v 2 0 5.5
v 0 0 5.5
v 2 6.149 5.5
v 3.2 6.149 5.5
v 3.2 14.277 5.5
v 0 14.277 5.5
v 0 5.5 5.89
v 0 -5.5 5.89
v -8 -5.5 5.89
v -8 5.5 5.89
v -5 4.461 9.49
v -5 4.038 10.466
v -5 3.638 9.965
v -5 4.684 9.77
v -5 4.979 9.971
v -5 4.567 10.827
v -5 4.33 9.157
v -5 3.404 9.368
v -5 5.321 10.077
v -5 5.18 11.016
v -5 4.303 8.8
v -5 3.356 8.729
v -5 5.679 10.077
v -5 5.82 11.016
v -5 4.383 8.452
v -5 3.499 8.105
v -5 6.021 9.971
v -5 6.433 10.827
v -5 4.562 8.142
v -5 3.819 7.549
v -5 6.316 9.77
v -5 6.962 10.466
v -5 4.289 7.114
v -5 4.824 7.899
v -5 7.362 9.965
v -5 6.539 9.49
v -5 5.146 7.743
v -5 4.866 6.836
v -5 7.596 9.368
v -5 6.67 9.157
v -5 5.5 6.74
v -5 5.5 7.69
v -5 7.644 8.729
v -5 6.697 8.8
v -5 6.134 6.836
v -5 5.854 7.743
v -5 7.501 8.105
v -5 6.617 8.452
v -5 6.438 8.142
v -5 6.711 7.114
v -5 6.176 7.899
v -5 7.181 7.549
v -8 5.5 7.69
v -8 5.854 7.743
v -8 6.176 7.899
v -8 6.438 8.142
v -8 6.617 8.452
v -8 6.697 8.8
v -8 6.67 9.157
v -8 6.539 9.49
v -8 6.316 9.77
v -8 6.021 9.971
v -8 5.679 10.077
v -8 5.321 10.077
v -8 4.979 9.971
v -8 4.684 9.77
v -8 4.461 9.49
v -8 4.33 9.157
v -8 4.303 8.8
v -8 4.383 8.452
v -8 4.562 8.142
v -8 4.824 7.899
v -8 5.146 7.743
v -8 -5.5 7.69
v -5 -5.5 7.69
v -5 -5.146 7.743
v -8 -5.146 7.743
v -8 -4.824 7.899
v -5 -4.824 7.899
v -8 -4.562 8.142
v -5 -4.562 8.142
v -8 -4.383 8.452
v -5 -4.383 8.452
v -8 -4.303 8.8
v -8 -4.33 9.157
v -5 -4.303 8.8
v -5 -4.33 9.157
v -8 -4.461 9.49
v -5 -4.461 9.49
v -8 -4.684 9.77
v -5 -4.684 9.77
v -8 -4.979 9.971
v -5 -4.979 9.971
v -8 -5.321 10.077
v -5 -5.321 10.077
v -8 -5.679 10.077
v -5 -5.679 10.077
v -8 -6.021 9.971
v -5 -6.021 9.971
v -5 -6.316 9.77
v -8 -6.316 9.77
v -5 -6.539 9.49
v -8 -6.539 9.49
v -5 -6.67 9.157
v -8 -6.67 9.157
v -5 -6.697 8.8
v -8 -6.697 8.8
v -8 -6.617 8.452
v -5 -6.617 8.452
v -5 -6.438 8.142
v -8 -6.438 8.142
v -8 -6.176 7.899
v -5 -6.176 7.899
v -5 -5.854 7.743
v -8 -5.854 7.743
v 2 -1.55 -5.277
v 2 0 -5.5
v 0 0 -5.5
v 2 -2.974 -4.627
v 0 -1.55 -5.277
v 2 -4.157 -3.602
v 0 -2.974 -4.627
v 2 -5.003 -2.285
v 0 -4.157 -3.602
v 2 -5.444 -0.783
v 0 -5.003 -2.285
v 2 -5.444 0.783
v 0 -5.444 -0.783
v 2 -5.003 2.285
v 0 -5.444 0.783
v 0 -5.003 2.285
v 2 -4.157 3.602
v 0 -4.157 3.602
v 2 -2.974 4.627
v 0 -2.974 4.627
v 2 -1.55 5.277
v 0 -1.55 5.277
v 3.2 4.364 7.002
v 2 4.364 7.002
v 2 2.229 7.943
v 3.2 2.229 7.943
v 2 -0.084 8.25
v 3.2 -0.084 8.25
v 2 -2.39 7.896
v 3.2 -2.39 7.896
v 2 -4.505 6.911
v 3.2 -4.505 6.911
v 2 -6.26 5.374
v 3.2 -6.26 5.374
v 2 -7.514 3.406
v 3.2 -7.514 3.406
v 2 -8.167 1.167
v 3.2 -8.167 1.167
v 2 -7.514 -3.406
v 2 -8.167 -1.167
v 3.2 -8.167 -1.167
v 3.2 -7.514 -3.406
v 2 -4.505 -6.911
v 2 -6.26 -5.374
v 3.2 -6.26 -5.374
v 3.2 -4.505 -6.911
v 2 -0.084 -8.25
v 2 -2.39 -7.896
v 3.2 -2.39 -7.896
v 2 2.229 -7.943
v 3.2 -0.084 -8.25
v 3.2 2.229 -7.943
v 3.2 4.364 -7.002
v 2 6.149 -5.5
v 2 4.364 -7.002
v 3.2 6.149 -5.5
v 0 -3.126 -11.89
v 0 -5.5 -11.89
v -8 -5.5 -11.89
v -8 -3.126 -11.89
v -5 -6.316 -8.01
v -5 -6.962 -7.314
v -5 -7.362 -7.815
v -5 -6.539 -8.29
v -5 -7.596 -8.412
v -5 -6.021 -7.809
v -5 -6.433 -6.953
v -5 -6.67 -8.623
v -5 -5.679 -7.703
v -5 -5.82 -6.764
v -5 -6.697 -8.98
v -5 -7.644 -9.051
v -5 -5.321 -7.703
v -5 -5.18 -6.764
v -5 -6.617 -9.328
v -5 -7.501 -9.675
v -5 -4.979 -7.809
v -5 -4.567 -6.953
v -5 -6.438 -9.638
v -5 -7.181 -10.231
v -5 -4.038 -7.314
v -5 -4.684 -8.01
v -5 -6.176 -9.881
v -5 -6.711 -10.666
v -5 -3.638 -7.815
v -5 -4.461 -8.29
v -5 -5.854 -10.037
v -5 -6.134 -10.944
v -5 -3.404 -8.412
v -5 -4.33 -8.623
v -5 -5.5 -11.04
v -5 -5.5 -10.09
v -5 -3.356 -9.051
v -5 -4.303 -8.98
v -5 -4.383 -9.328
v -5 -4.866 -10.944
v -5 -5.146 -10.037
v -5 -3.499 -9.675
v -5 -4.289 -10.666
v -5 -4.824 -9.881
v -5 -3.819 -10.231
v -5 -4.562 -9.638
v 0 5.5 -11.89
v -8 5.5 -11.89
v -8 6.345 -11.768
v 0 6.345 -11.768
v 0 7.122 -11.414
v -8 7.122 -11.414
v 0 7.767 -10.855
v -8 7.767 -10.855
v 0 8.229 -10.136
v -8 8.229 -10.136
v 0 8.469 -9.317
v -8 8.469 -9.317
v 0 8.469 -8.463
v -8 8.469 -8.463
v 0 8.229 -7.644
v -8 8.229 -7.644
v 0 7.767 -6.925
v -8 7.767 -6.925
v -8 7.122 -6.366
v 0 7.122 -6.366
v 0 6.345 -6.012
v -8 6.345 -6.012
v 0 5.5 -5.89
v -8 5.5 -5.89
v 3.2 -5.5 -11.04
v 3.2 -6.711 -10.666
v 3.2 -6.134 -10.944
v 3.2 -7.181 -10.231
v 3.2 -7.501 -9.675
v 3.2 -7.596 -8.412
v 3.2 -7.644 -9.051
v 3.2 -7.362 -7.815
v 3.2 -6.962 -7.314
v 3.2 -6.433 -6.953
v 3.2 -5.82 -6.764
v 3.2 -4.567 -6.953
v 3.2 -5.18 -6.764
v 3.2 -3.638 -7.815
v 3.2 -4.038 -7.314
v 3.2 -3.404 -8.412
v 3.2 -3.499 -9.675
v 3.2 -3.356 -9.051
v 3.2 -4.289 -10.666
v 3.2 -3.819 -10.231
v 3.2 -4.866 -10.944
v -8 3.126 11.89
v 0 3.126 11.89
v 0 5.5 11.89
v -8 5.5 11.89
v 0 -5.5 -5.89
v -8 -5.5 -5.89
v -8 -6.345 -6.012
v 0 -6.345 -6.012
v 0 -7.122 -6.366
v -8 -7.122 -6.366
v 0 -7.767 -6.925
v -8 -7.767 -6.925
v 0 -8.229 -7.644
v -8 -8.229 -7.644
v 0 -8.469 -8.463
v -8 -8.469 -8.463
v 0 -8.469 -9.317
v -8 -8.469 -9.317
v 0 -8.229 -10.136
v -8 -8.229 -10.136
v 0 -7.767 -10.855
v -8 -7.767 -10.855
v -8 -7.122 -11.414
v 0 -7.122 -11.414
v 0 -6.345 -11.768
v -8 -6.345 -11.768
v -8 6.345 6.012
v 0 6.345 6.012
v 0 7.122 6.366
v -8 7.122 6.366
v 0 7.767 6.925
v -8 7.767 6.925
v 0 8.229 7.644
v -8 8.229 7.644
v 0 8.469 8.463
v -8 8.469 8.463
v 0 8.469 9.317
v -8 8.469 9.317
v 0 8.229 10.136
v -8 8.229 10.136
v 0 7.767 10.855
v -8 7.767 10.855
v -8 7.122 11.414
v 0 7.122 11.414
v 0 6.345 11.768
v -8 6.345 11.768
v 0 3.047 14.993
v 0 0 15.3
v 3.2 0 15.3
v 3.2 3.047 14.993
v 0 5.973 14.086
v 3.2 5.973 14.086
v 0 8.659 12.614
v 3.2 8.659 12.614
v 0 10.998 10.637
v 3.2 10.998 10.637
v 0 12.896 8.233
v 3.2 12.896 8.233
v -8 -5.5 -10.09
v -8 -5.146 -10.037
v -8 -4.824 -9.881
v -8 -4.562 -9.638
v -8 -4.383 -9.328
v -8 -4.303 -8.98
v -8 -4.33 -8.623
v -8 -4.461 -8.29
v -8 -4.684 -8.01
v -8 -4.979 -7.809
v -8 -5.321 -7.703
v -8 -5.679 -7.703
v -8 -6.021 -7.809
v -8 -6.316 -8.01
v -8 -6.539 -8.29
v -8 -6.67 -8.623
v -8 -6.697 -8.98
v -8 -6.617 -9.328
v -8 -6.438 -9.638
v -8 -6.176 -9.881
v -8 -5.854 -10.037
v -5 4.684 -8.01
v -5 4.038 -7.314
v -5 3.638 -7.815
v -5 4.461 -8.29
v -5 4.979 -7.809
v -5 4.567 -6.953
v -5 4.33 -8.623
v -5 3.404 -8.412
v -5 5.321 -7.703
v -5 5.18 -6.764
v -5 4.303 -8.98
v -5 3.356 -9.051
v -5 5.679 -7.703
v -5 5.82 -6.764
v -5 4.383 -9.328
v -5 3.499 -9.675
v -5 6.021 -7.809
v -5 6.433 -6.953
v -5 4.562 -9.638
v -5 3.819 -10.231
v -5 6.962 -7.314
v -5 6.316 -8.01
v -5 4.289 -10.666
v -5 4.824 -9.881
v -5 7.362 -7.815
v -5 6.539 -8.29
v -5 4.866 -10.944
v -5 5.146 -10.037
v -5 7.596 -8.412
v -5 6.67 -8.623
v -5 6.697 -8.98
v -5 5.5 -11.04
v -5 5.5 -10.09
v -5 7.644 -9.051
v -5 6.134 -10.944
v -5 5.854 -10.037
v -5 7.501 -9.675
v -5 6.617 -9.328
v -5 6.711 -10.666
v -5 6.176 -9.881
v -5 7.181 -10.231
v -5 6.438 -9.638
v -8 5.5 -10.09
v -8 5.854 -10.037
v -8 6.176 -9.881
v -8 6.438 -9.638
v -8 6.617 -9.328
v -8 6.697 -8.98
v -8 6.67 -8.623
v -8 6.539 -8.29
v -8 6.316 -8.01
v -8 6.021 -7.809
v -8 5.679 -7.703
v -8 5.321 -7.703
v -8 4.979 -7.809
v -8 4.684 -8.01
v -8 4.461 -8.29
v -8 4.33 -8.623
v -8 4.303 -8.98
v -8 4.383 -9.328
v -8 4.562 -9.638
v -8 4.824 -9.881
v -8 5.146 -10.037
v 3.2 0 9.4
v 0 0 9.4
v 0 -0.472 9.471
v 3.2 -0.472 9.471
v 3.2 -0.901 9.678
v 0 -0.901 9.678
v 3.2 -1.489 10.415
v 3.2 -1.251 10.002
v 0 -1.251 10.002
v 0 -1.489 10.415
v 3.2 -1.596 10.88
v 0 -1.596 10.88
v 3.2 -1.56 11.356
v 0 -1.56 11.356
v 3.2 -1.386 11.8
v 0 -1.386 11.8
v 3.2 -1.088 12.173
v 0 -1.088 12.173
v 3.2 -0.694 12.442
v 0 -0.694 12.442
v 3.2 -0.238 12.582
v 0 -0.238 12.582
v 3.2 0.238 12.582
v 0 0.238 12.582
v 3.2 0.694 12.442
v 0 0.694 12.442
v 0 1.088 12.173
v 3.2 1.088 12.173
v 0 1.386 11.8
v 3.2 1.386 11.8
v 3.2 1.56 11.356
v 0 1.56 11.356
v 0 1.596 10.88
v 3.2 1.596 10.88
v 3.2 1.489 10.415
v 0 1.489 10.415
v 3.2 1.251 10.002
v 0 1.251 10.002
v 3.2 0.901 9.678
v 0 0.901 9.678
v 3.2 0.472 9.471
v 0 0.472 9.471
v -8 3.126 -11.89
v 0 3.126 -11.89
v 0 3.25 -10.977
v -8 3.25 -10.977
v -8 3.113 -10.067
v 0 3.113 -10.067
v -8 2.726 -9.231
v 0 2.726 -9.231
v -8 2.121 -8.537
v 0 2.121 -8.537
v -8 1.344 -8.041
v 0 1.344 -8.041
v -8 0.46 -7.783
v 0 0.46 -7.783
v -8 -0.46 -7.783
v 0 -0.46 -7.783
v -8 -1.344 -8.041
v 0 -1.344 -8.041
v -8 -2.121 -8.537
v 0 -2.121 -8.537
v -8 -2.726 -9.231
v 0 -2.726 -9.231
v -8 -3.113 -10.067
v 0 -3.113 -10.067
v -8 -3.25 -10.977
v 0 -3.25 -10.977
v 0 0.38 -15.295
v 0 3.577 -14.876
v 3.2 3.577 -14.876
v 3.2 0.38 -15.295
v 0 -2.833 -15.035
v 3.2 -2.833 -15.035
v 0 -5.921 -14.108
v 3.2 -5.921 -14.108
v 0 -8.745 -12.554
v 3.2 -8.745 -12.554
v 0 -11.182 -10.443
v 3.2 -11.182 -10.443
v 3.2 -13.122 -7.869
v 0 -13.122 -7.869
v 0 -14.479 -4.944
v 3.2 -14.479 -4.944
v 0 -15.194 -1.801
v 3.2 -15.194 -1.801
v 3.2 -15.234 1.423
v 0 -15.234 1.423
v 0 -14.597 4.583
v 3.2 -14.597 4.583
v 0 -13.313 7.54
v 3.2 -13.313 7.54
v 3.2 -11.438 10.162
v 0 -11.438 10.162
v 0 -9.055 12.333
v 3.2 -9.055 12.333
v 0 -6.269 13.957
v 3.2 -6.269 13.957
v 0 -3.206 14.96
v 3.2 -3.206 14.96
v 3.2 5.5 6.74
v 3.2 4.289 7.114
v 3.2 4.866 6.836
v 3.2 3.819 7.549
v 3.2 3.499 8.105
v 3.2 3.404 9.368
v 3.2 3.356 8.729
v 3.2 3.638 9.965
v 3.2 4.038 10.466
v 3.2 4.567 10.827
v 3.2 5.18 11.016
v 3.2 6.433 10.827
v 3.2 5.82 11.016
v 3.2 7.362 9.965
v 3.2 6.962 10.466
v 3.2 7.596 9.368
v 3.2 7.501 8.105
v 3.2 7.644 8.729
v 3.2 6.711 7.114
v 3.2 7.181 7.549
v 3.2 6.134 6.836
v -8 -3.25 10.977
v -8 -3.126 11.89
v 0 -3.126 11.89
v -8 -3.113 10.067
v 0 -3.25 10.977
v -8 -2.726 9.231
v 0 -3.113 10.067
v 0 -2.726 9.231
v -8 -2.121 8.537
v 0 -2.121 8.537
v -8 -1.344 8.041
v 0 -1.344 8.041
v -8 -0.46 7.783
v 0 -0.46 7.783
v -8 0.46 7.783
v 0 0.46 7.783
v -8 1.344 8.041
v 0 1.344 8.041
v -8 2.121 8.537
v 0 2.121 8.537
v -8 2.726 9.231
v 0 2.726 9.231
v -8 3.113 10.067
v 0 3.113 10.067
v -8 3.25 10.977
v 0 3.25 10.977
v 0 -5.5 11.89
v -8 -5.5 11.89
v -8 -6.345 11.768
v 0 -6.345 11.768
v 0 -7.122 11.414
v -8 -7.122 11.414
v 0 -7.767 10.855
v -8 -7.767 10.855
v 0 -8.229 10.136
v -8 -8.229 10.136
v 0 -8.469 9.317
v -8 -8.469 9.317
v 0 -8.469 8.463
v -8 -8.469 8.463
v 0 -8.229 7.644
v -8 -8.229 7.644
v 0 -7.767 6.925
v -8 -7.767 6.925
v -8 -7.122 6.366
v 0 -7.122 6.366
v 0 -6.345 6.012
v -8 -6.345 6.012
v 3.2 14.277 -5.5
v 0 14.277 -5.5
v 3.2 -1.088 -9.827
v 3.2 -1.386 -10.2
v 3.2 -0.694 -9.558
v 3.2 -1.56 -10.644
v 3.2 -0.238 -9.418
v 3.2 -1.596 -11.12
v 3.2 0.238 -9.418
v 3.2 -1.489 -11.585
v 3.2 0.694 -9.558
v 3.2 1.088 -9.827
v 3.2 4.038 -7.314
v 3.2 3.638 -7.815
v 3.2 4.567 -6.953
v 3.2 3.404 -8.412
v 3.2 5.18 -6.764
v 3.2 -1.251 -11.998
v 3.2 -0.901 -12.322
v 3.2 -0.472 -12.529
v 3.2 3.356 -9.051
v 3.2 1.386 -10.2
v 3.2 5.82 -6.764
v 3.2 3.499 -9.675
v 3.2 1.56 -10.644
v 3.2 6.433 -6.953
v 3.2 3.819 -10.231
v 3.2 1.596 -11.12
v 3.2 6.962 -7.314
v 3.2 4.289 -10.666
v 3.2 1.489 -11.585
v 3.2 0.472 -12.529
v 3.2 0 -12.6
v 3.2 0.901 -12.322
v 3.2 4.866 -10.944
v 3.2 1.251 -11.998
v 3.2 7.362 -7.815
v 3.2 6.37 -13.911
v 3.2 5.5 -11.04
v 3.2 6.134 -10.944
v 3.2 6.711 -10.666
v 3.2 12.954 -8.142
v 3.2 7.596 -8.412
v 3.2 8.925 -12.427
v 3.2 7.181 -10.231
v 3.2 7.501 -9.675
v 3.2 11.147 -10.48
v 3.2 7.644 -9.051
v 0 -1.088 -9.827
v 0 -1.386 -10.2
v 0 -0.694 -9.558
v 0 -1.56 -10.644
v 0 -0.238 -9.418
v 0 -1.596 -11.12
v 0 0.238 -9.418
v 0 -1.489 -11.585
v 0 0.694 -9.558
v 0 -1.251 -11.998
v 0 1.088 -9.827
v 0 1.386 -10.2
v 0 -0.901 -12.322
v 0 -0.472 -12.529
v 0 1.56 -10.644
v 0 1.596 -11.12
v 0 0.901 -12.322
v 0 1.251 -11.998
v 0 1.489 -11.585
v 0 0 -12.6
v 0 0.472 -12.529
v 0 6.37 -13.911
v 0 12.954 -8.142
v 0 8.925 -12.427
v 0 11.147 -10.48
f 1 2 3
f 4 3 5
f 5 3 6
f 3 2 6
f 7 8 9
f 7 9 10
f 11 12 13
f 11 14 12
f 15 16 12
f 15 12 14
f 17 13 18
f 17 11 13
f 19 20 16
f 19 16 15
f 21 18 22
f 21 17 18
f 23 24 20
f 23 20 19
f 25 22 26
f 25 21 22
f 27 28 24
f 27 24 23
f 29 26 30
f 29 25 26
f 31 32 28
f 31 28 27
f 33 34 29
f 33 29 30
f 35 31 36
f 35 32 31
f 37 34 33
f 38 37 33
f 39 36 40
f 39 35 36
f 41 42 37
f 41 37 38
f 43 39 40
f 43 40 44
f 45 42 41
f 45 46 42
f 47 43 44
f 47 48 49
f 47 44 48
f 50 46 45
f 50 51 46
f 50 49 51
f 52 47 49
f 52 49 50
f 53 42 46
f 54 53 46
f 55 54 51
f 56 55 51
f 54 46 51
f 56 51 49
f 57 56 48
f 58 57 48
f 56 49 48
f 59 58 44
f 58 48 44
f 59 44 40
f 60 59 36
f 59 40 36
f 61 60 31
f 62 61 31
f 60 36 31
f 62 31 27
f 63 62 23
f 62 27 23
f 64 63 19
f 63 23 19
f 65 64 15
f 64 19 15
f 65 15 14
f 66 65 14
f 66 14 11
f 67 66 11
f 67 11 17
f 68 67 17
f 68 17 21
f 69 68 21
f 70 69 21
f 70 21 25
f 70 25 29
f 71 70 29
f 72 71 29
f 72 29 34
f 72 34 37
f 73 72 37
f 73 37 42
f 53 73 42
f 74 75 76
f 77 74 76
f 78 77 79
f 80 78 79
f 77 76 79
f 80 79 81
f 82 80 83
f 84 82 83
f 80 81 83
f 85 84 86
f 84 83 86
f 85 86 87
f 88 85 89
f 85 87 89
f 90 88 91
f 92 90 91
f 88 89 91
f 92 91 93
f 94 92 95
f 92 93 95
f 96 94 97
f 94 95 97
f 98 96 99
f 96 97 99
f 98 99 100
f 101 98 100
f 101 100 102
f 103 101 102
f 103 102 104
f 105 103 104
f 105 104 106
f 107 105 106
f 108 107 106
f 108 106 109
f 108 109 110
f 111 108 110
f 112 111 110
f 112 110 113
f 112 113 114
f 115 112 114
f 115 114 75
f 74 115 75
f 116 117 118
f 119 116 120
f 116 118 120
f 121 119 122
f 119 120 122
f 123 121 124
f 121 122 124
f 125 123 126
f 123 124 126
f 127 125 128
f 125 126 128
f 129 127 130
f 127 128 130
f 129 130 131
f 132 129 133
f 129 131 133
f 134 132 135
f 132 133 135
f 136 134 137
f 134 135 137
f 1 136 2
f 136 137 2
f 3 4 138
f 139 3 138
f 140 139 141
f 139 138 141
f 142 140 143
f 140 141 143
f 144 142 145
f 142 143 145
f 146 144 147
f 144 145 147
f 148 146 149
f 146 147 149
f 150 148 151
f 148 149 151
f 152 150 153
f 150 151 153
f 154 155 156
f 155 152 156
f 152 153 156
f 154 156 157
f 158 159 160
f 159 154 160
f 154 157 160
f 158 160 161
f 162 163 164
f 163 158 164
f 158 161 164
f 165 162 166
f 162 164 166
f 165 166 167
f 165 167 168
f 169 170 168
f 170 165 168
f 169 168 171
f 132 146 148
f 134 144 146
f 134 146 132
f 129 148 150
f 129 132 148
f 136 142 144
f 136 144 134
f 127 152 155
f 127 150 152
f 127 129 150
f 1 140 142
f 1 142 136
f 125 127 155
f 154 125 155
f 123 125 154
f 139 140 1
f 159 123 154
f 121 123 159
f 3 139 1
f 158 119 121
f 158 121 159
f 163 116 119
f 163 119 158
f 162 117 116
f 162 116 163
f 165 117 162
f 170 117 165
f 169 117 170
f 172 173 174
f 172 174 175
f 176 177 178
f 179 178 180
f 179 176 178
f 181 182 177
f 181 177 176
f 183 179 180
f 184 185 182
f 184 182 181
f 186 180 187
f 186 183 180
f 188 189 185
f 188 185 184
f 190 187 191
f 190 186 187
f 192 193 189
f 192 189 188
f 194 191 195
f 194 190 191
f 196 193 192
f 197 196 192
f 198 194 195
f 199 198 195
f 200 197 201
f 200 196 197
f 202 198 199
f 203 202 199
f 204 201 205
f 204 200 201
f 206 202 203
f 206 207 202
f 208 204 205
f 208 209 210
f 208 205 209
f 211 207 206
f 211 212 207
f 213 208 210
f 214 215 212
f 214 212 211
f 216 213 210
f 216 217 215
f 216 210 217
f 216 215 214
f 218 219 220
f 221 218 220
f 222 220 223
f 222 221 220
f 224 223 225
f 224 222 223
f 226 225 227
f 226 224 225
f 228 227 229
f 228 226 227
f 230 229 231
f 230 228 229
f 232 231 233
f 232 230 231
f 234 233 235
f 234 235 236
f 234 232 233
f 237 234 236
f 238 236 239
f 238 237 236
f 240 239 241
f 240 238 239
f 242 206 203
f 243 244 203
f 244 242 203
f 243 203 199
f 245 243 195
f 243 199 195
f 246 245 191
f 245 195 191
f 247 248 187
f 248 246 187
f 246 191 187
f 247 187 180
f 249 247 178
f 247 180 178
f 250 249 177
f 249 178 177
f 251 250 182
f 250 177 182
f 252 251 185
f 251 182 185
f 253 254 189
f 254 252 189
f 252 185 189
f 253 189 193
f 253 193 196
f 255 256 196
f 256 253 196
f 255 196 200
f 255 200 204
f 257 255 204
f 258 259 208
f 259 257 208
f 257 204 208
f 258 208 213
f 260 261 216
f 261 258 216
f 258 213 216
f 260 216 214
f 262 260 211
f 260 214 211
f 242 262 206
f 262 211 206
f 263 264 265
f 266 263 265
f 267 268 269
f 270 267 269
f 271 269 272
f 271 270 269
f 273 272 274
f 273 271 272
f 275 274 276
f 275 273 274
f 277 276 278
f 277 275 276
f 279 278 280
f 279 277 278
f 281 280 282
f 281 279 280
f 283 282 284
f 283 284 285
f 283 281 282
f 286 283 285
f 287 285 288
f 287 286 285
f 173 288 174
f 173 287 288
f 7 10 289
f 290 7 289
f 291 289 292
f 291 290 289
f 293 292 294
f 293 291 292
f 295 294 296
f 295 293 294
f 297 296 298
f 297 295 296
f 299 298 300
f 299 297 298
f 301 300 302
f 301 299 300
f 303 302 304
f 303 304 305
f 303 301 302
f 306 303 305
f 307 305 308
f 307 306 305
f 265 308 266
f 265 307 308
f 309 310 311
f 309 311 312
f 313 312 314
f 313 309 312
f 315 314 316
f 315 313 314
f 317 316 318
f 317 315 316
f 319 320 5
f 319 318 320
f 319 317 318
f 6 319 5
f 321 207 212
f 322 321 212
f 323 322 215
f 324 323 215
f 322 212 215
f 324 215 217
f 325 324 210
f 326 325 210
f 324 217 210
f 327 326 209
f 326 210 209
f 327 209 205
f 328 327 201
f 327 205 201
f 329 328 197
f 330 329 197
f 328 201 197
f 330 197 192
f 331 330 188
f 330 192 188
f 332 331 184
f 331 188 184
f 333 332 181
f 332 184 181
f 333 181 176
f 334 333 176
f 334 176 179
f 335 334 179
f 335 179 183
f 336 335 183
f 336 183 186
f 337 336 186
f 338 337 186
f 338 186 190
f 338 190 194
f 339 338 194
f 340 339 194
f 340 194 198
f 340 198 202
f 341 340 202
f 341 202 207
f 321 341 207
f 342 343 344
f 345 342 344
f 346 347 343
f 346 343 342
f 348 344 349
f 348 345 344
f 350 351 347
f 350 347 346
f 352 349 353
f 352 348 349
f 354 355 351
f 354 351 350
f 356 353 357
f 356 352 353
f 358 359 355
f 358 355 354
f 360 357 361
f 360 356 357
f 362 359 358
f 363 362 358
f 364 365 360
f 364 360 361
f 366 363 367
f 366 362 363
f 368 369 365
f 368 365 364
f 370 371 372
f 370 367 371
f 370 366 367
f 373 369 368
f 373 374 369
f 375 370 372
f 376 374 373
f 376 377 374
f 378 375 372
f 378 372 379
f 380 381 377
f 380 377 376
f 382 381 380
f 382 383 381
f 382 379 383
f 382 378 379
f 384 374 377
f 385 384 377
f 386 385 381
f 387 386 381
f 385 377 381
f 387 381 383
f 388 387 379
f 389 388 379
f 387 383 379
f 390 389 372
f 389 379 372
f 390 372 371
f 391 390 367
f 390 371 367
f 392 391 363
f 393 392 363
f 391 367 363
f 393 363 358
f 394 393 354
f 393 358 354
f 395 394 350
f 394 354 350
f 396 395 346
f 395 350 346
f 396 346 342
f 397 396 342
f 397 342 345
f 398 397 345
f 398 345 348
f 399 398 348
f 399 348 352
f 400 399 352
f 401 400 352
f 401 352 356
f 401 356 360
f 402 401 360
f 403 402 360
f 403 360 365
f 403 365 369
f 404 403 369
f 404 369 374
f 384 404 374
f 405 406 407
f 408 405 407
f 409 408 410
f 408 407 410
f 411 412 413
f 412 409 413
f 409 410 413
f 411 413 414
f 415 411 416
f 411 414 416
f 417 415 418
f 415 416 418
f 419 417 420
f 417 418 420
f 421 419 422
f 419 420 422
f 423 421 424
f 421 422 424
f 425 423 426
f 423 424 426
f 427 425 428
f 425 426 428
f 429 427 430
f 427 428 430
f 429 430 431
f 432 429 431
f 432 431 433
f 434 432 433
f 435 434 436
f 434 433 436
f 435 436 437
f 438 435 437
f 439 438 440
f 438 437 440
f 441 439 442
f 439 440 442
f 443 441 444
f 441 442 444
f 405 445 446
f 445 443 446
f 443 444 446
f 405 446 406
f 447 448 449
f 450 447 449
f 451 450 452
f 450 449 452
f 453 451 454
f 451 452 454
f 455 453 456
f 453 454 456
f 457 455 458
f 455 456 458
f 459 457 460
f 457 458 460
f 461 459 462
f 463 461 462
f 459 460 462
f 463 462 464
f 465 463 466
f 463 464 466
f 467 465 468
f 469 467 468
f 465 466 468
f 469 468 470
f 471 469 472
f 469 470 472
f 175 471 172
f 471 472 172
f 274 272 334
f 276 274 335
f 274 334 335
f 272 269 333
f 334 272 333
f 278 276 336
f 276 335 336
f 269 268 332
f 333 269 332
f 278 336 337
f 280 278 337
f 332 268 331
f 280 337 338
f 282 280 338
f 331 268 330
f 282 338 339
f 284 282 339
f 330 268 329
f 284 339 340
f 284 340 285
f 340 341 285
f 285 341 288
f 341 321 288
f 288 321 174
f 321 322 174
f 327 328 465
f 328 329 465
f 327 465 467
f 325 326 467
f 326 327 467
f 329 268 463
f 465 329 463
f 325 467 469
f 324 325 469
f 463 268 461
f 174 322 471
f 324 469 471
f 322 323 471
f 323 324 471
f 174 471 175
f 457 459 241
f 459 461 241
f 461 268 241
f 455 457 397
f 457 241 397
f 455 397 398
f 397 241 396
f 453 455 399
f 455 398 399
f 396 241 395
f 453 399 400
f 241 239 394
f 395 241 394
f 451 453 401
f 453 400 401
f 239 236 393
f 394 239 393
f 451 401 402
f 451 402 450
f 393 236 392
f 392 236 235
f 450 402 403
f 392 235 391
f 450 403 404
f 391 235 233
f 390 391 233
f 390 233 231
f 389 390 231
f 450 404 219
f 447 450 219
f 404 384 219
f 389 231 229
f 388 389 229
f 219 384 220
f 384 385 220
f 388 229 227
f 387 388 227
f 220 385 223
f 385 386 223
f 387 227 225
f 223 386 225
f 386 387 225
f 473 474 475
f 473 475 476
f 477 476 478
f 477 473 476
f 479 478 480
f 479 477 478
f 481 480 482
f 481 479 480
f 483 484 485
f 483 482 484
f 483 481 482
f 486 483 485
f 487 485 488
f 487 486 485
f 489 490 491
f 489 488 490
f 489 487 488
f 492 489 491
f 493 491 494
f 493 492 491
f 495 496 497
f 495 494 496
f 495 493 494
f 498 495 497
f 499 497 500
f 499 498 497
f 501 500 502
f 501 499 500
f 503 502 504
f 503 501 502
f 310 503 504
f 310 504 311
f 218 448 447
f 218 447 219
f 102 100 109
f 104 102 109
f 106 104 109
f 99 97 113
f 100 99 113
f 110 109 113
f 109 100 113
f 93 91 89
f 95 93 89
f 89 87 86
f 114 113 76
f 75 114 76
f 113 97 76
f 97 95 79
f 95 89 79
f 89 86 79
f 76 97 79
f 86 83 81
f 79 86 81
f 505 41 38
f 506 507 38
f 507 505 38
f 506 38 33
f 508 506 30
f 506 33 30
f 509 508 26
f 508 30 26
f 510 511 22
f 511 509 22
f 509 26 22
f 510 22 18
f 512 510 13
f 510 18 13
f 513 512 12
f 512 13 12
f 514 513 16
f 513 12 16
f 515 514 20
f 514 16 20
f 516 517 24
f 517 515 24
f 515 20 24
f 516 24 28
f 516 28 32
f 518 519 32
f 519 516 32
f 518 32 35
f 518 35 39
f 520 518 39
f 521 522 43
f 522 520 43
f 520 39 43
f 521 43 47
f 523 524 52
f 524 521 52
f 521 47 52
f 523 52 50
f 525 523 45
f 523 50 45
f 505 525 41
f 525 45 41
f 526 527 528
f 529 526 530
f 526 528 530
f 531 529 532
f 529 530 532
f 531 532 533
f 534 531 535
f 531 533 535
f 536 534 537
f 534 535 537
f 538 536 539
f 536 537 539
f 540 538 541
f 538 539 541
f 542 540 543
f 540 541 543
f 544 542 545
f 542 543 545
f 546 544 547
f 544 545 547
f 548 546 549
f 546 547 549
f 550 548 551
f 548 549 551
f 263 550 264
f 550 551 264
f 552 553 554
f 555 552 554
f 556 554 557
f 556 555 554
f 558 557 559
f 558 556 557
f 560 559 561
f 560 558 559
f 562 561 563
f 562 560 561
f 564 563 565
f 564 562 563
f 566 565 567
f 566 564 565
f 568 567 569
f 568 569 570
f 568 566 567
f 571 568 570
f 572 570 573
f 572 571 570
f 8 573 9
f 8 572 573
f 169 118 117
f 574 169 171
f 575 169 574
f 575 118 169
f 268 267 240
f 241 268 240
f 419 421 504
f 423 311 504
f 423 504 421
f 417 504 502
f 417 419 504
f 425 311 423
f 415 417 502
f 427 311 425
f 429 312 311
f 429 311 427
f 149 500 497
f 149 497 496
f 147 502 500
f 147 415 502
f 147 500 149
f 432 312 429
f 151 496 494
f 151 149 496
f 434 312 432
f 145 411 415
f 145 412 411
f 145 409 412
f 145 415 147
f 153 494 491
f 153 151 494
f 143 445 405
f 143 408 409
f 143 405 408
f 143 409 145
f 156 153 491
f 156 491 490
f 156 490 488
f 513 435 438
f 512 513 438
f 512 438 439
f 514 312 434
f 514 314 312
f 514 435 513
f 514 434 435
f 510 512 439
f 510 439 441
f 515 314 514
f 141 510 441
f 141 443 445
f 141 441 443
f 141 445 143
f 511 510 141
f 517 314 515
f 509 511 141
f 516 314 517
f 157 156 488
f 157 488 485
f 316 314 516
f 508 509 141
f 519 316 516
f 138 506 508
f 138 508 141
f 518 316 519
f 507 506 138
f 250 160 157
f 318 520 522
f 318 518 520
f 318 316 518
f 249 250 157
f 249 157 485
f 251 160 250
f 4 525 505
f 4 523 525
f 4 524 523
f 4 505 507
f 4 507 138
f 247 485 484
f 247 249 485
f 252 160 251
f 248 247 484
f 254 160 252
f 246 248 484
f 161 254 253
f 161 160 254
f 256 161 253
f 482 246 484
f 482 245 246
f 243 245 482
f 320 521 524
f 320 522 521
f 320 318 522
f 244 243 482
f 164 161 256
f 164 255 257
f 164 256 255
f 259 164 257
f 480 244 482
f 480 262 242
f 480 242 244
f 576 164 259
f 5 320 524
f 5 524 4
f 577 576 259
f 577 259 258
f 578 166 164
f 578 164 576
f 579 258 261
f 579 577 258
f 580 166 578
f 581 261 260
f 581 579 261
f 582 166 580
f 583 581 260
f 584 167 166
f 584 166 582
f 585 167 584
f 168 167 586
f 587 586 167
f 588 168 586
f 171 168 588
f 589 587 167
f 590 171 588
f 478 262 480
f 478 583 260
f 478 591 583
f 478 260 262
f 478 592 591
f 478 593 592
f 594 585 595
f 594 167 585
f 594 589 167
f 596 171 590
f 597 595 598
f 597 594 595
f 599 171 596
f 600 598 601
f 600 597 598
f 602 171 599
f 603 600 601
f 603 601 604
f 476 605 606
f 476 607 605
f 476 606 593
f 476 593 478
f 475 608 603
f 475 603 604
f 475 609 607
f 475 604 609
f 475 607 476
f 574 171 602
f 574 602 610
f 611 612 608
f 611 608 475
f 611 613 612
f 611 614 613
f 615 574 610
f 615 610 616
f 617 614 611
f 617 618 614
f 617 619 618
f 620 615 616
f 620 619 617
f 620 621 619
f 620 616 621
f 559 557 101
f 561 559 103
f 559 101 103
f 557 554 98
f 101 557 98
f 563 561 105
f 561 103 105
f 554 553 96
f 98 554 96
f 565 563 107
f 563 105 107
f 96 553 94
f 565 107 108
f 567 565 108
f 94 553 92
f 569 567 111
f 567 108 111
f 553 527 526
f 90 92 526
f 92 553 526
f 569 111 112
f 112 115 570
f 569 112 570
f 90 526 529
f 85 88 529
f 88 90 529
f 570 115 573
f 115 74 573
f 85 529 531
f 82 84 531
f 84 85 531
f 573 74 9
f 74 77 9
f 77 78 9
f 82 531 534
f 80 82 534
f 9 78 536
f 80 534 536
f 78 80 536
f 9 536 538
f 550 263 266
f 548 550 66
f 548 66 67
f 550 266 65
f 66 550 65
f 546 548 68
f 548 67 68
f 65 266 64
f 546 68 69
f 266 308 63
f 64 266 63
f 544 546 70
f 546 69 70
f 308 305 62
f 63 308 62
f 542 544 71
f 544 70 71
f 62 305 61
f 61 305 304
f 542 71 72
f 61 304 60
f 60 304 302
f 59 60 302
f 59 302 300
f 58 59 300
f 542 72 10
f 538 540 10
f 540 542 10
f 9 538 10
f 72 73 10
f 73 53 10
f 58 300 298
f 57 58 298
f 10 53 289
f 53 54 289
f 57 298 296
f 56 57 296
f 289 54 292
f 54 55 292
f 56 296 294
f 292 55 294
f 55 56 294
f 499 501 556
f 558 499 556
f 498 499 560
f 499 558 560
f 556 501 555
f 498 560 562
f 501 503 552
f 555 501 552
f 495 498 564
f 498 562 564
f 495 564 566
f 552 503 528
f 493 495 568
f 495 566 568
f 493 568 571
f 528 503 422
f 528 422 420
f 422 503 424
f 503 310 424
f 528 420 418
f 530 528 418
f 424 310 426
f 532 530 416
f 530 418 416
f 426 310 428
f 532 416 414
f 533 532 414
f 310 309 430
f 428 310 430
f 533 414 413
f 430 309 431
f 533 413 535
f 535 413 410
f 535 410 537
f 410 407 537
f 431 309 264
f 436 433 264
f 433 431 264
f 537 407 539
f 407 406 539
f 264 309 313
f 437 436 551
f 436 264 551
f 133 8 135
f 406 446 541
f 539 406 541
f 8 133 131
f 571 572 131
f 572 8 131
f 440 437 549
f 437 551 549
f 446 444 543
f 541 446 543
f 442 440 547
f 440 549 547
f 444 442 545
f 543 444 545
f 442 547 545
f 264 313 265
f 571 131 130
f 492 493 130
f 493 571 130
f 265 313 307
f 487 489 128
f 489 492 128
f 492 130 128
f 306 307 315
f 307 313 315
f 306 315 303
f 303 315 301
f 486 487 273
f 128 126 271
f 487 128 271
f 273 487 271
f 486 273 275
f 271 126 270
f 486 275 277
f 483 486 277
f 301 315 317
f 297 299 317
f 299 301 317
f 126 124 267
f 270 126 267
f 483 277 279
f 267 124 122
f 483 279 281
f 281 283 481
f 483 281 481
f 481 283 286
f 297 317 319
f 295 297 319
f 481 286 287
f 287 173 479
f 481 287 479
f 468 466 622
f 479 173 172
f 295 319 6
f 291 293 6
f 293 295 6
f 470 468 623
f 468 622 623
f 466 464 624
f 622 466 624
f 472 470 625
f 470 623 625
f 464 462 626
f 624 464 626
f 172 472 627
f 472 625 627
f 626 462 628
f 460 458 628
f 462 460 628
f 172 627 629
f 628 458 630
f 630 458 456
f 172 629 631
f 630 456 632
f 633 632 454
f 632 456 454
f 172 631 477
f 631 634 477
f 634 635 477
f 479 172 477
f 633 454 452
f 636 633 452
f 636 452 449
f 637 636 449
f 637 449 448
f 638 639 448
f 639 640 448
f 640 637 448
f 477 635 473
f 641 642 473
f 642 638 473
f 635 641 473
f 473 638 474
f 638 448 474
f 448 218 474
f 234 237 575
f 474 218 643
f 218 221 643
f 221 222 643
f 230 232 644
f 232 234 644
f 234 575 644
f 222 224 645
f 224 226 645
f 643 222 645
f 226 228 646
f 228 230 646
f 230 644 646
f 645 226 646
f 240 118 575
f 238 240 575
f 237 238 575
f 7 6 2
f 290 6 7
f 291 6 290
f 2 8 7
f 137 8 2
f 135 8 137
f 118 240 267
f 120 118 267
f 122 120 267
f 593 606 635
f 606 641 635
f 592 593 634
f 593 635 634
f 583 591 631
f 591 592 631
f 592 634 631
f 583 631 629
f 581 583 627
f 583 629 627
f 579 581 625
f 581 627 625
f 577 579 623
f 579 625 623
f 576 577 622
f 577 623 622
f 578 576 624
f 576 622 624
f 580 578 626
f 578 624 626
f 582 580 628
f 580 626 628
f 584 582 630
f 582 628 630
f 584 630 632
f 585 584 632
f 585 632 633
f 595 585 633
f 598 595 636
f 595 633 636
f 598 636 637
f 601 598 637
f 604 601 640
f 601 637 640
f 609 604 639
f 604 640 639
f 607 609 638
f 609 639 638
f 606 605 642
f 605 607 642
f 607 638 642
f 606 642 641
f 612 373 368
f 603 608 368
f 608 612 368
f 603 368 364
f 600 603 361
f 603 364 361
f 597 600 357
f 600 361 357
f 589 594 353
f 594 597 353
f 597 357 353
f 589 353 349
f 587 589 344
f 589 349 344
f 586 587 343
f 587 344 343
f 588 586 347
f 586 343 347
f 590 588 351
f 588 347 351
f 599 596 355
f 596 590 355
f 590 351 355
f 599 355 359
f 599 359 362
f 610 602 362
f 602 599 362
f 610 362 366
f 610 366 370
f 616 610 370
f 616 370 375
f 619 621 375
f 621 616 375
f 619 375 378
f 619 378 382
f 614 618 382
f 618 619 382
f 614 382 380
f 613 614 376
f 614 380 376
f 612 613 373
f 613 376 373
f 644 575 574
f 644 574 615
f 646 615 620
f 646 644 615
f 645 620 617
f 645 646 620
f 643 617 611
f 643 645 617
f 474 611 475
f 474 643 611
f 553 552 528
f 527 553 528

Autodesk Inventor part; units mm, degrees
ref_plane "YZ Plane" through (0, 0, 0) normal (1, 0, 0) x (0, 1, 0)
ref_plane "XZ Plane" through (0, 0, 0) normal (0, 1, 0) x (-1, 0, 0)
ref_plane "Arbeitsebene1" through (0, 0, 0) normal (1, 0, 0) x (0, 0, -1)
sketch "Skizze1" plane through (0, 0, 0) normal (1, 0, 0) x (0, 0, -1)
  circle A0 centre (0, 0) radius 5.5
  line L0 (-24.52, 0) -> (24.52, 0) construction
  line L1 (0, -23.5528) -> (0, 22.3555) construction
  line L2 (8.89, -5.5) -> (-8.89, -5.5) construction
  line L3 (-8.89, -5.5) -> (-8.89, 5.5) construction
  line L4 (-8.89, 5.5) -> (8.89, 5.5) construction
  line L5 (8.89, 5.5) -> (8.89, -5.5) construction
  circle A1 centre (8.89, 5.5) radius 1.2
  circle A2 centre (-8.89, 5.5) radius 1.2
  arc A3 (-15.3, 0) -> (14.8761, 3.5767) centre (0, 0) ccw
  arc A4 (4.4, 3.3) -> (-4.4, 3.3) centre (0, 0) ccw
  circle A5 centre (8.89, -5.5) radius 1.2
  circle A6 centre (-8.89, -5.5) radius 1.2
  line L6 (-5.89, -5.5) -> (-5.89, 5.5)
  arc A7 (-5.89, 5.5) -> (-11.89, 5.5) centre (-8.89, 5.5) ccw
  arc A8 (11.89, 5.5) -> (5.89, 5.5) centre (8.89, 5.5) ccw
  line L7 (5.89, -5.5) -> (5.89, 5.5)
  circle A9 centre (8.89, -5.5) radius 2.15
  circle A10 centre (8.89, 5.5) radius 2.15
  circle A11 centre (-8.89, 5.5) radius 2.15
  circle A12 centre (0, 0) radius 11 construction
  circle A13 centre (-11, 0) radius 1.6
  circle A14 centre (11, 0) radius 1.6
  arc A15 (-11.89, -5.5) -> (-5.89, -5.5) centre (-8.89, -5.5) ccw
  arc A16 (5.89, -5.5) -> (11.89, -5.5) centre (8.89, -5.5) ccw
  line L8 (5.5, 0) -> (5.5, 14.2773)
  line L9 (-5.5, 0) -> (-5.5, 14.2773)
  arc A17 (15.3, 0) -> (5.5, 14.2773) centre (0, 0) ccw
  arc A18 (-5.5, 14.2773) -> (-15.3, 0) centre (0, 0) ccw
  line L10 (11.89, -5.5) -> (11.89, -3.1258)
  line L11 (11.89, 3.1258) -> (11.89, 5.5)
  line L12 (-11.89, -5.5) -> (-11.89, -3.1258)
  line L13 (-11.89, 3.1258) -> (-11.89, 5.5)
  circle A19 centre (11, 0) radius 3.25
  circle A20 centre (-11, 0) radius 3.25
  circle A21 centre (-8.89, -5.5) radius 2.15
  dimension "d2" = 11
  dimension "d19" = 11
  dimension "d20" = 17.78
  dimension "d22" = 2.4
  dimension "d29" = 15.3
  dimension "d30" = 5.5
  dimension "d38" = 3
  dimension "d52" = 22
  dimension "d53" = 3.2
  dimension "d55" = 6.5
  dimension "d60" = 4.3
extrude "Extrusion7" add sketch "Skizze1" along normal blind 3.2 contours L8 A17 A3 A18 L9 A0 | A6 | A15 L12 A20 L13 A7 L6 | A20 | L11 A19 L10 A16 L7 A8 | A19 | A21
extrude "Extrusion3" add sketch "Skizze1" against normal blind 5 from surface at 0 contours A6 | A15 L12 A20 L13 A7 L6 | L11 A19 L10 A16 L7 A8 | A21
extrude "Extrusion4" add sketch "Skizze1" against normal blind 3 from surface at -5 contours A15 L12 A20 L13 A7 L6 | L11 A19 L10 A16 L7 A8 | A9 | A10 | A11 | A21
sketch "Skizze2" plane through (3.2, 0, 0) normal (1, 0, 0) x (0, 0, -1)
  circle A0 centre (0, 0) radius 8.25
  dimension "d57" = 16.5
extrude "Extrusion9" cut sketch "Skizze2" against normal blind 1.2
properties part number "AS5047DEnclosureV2"
